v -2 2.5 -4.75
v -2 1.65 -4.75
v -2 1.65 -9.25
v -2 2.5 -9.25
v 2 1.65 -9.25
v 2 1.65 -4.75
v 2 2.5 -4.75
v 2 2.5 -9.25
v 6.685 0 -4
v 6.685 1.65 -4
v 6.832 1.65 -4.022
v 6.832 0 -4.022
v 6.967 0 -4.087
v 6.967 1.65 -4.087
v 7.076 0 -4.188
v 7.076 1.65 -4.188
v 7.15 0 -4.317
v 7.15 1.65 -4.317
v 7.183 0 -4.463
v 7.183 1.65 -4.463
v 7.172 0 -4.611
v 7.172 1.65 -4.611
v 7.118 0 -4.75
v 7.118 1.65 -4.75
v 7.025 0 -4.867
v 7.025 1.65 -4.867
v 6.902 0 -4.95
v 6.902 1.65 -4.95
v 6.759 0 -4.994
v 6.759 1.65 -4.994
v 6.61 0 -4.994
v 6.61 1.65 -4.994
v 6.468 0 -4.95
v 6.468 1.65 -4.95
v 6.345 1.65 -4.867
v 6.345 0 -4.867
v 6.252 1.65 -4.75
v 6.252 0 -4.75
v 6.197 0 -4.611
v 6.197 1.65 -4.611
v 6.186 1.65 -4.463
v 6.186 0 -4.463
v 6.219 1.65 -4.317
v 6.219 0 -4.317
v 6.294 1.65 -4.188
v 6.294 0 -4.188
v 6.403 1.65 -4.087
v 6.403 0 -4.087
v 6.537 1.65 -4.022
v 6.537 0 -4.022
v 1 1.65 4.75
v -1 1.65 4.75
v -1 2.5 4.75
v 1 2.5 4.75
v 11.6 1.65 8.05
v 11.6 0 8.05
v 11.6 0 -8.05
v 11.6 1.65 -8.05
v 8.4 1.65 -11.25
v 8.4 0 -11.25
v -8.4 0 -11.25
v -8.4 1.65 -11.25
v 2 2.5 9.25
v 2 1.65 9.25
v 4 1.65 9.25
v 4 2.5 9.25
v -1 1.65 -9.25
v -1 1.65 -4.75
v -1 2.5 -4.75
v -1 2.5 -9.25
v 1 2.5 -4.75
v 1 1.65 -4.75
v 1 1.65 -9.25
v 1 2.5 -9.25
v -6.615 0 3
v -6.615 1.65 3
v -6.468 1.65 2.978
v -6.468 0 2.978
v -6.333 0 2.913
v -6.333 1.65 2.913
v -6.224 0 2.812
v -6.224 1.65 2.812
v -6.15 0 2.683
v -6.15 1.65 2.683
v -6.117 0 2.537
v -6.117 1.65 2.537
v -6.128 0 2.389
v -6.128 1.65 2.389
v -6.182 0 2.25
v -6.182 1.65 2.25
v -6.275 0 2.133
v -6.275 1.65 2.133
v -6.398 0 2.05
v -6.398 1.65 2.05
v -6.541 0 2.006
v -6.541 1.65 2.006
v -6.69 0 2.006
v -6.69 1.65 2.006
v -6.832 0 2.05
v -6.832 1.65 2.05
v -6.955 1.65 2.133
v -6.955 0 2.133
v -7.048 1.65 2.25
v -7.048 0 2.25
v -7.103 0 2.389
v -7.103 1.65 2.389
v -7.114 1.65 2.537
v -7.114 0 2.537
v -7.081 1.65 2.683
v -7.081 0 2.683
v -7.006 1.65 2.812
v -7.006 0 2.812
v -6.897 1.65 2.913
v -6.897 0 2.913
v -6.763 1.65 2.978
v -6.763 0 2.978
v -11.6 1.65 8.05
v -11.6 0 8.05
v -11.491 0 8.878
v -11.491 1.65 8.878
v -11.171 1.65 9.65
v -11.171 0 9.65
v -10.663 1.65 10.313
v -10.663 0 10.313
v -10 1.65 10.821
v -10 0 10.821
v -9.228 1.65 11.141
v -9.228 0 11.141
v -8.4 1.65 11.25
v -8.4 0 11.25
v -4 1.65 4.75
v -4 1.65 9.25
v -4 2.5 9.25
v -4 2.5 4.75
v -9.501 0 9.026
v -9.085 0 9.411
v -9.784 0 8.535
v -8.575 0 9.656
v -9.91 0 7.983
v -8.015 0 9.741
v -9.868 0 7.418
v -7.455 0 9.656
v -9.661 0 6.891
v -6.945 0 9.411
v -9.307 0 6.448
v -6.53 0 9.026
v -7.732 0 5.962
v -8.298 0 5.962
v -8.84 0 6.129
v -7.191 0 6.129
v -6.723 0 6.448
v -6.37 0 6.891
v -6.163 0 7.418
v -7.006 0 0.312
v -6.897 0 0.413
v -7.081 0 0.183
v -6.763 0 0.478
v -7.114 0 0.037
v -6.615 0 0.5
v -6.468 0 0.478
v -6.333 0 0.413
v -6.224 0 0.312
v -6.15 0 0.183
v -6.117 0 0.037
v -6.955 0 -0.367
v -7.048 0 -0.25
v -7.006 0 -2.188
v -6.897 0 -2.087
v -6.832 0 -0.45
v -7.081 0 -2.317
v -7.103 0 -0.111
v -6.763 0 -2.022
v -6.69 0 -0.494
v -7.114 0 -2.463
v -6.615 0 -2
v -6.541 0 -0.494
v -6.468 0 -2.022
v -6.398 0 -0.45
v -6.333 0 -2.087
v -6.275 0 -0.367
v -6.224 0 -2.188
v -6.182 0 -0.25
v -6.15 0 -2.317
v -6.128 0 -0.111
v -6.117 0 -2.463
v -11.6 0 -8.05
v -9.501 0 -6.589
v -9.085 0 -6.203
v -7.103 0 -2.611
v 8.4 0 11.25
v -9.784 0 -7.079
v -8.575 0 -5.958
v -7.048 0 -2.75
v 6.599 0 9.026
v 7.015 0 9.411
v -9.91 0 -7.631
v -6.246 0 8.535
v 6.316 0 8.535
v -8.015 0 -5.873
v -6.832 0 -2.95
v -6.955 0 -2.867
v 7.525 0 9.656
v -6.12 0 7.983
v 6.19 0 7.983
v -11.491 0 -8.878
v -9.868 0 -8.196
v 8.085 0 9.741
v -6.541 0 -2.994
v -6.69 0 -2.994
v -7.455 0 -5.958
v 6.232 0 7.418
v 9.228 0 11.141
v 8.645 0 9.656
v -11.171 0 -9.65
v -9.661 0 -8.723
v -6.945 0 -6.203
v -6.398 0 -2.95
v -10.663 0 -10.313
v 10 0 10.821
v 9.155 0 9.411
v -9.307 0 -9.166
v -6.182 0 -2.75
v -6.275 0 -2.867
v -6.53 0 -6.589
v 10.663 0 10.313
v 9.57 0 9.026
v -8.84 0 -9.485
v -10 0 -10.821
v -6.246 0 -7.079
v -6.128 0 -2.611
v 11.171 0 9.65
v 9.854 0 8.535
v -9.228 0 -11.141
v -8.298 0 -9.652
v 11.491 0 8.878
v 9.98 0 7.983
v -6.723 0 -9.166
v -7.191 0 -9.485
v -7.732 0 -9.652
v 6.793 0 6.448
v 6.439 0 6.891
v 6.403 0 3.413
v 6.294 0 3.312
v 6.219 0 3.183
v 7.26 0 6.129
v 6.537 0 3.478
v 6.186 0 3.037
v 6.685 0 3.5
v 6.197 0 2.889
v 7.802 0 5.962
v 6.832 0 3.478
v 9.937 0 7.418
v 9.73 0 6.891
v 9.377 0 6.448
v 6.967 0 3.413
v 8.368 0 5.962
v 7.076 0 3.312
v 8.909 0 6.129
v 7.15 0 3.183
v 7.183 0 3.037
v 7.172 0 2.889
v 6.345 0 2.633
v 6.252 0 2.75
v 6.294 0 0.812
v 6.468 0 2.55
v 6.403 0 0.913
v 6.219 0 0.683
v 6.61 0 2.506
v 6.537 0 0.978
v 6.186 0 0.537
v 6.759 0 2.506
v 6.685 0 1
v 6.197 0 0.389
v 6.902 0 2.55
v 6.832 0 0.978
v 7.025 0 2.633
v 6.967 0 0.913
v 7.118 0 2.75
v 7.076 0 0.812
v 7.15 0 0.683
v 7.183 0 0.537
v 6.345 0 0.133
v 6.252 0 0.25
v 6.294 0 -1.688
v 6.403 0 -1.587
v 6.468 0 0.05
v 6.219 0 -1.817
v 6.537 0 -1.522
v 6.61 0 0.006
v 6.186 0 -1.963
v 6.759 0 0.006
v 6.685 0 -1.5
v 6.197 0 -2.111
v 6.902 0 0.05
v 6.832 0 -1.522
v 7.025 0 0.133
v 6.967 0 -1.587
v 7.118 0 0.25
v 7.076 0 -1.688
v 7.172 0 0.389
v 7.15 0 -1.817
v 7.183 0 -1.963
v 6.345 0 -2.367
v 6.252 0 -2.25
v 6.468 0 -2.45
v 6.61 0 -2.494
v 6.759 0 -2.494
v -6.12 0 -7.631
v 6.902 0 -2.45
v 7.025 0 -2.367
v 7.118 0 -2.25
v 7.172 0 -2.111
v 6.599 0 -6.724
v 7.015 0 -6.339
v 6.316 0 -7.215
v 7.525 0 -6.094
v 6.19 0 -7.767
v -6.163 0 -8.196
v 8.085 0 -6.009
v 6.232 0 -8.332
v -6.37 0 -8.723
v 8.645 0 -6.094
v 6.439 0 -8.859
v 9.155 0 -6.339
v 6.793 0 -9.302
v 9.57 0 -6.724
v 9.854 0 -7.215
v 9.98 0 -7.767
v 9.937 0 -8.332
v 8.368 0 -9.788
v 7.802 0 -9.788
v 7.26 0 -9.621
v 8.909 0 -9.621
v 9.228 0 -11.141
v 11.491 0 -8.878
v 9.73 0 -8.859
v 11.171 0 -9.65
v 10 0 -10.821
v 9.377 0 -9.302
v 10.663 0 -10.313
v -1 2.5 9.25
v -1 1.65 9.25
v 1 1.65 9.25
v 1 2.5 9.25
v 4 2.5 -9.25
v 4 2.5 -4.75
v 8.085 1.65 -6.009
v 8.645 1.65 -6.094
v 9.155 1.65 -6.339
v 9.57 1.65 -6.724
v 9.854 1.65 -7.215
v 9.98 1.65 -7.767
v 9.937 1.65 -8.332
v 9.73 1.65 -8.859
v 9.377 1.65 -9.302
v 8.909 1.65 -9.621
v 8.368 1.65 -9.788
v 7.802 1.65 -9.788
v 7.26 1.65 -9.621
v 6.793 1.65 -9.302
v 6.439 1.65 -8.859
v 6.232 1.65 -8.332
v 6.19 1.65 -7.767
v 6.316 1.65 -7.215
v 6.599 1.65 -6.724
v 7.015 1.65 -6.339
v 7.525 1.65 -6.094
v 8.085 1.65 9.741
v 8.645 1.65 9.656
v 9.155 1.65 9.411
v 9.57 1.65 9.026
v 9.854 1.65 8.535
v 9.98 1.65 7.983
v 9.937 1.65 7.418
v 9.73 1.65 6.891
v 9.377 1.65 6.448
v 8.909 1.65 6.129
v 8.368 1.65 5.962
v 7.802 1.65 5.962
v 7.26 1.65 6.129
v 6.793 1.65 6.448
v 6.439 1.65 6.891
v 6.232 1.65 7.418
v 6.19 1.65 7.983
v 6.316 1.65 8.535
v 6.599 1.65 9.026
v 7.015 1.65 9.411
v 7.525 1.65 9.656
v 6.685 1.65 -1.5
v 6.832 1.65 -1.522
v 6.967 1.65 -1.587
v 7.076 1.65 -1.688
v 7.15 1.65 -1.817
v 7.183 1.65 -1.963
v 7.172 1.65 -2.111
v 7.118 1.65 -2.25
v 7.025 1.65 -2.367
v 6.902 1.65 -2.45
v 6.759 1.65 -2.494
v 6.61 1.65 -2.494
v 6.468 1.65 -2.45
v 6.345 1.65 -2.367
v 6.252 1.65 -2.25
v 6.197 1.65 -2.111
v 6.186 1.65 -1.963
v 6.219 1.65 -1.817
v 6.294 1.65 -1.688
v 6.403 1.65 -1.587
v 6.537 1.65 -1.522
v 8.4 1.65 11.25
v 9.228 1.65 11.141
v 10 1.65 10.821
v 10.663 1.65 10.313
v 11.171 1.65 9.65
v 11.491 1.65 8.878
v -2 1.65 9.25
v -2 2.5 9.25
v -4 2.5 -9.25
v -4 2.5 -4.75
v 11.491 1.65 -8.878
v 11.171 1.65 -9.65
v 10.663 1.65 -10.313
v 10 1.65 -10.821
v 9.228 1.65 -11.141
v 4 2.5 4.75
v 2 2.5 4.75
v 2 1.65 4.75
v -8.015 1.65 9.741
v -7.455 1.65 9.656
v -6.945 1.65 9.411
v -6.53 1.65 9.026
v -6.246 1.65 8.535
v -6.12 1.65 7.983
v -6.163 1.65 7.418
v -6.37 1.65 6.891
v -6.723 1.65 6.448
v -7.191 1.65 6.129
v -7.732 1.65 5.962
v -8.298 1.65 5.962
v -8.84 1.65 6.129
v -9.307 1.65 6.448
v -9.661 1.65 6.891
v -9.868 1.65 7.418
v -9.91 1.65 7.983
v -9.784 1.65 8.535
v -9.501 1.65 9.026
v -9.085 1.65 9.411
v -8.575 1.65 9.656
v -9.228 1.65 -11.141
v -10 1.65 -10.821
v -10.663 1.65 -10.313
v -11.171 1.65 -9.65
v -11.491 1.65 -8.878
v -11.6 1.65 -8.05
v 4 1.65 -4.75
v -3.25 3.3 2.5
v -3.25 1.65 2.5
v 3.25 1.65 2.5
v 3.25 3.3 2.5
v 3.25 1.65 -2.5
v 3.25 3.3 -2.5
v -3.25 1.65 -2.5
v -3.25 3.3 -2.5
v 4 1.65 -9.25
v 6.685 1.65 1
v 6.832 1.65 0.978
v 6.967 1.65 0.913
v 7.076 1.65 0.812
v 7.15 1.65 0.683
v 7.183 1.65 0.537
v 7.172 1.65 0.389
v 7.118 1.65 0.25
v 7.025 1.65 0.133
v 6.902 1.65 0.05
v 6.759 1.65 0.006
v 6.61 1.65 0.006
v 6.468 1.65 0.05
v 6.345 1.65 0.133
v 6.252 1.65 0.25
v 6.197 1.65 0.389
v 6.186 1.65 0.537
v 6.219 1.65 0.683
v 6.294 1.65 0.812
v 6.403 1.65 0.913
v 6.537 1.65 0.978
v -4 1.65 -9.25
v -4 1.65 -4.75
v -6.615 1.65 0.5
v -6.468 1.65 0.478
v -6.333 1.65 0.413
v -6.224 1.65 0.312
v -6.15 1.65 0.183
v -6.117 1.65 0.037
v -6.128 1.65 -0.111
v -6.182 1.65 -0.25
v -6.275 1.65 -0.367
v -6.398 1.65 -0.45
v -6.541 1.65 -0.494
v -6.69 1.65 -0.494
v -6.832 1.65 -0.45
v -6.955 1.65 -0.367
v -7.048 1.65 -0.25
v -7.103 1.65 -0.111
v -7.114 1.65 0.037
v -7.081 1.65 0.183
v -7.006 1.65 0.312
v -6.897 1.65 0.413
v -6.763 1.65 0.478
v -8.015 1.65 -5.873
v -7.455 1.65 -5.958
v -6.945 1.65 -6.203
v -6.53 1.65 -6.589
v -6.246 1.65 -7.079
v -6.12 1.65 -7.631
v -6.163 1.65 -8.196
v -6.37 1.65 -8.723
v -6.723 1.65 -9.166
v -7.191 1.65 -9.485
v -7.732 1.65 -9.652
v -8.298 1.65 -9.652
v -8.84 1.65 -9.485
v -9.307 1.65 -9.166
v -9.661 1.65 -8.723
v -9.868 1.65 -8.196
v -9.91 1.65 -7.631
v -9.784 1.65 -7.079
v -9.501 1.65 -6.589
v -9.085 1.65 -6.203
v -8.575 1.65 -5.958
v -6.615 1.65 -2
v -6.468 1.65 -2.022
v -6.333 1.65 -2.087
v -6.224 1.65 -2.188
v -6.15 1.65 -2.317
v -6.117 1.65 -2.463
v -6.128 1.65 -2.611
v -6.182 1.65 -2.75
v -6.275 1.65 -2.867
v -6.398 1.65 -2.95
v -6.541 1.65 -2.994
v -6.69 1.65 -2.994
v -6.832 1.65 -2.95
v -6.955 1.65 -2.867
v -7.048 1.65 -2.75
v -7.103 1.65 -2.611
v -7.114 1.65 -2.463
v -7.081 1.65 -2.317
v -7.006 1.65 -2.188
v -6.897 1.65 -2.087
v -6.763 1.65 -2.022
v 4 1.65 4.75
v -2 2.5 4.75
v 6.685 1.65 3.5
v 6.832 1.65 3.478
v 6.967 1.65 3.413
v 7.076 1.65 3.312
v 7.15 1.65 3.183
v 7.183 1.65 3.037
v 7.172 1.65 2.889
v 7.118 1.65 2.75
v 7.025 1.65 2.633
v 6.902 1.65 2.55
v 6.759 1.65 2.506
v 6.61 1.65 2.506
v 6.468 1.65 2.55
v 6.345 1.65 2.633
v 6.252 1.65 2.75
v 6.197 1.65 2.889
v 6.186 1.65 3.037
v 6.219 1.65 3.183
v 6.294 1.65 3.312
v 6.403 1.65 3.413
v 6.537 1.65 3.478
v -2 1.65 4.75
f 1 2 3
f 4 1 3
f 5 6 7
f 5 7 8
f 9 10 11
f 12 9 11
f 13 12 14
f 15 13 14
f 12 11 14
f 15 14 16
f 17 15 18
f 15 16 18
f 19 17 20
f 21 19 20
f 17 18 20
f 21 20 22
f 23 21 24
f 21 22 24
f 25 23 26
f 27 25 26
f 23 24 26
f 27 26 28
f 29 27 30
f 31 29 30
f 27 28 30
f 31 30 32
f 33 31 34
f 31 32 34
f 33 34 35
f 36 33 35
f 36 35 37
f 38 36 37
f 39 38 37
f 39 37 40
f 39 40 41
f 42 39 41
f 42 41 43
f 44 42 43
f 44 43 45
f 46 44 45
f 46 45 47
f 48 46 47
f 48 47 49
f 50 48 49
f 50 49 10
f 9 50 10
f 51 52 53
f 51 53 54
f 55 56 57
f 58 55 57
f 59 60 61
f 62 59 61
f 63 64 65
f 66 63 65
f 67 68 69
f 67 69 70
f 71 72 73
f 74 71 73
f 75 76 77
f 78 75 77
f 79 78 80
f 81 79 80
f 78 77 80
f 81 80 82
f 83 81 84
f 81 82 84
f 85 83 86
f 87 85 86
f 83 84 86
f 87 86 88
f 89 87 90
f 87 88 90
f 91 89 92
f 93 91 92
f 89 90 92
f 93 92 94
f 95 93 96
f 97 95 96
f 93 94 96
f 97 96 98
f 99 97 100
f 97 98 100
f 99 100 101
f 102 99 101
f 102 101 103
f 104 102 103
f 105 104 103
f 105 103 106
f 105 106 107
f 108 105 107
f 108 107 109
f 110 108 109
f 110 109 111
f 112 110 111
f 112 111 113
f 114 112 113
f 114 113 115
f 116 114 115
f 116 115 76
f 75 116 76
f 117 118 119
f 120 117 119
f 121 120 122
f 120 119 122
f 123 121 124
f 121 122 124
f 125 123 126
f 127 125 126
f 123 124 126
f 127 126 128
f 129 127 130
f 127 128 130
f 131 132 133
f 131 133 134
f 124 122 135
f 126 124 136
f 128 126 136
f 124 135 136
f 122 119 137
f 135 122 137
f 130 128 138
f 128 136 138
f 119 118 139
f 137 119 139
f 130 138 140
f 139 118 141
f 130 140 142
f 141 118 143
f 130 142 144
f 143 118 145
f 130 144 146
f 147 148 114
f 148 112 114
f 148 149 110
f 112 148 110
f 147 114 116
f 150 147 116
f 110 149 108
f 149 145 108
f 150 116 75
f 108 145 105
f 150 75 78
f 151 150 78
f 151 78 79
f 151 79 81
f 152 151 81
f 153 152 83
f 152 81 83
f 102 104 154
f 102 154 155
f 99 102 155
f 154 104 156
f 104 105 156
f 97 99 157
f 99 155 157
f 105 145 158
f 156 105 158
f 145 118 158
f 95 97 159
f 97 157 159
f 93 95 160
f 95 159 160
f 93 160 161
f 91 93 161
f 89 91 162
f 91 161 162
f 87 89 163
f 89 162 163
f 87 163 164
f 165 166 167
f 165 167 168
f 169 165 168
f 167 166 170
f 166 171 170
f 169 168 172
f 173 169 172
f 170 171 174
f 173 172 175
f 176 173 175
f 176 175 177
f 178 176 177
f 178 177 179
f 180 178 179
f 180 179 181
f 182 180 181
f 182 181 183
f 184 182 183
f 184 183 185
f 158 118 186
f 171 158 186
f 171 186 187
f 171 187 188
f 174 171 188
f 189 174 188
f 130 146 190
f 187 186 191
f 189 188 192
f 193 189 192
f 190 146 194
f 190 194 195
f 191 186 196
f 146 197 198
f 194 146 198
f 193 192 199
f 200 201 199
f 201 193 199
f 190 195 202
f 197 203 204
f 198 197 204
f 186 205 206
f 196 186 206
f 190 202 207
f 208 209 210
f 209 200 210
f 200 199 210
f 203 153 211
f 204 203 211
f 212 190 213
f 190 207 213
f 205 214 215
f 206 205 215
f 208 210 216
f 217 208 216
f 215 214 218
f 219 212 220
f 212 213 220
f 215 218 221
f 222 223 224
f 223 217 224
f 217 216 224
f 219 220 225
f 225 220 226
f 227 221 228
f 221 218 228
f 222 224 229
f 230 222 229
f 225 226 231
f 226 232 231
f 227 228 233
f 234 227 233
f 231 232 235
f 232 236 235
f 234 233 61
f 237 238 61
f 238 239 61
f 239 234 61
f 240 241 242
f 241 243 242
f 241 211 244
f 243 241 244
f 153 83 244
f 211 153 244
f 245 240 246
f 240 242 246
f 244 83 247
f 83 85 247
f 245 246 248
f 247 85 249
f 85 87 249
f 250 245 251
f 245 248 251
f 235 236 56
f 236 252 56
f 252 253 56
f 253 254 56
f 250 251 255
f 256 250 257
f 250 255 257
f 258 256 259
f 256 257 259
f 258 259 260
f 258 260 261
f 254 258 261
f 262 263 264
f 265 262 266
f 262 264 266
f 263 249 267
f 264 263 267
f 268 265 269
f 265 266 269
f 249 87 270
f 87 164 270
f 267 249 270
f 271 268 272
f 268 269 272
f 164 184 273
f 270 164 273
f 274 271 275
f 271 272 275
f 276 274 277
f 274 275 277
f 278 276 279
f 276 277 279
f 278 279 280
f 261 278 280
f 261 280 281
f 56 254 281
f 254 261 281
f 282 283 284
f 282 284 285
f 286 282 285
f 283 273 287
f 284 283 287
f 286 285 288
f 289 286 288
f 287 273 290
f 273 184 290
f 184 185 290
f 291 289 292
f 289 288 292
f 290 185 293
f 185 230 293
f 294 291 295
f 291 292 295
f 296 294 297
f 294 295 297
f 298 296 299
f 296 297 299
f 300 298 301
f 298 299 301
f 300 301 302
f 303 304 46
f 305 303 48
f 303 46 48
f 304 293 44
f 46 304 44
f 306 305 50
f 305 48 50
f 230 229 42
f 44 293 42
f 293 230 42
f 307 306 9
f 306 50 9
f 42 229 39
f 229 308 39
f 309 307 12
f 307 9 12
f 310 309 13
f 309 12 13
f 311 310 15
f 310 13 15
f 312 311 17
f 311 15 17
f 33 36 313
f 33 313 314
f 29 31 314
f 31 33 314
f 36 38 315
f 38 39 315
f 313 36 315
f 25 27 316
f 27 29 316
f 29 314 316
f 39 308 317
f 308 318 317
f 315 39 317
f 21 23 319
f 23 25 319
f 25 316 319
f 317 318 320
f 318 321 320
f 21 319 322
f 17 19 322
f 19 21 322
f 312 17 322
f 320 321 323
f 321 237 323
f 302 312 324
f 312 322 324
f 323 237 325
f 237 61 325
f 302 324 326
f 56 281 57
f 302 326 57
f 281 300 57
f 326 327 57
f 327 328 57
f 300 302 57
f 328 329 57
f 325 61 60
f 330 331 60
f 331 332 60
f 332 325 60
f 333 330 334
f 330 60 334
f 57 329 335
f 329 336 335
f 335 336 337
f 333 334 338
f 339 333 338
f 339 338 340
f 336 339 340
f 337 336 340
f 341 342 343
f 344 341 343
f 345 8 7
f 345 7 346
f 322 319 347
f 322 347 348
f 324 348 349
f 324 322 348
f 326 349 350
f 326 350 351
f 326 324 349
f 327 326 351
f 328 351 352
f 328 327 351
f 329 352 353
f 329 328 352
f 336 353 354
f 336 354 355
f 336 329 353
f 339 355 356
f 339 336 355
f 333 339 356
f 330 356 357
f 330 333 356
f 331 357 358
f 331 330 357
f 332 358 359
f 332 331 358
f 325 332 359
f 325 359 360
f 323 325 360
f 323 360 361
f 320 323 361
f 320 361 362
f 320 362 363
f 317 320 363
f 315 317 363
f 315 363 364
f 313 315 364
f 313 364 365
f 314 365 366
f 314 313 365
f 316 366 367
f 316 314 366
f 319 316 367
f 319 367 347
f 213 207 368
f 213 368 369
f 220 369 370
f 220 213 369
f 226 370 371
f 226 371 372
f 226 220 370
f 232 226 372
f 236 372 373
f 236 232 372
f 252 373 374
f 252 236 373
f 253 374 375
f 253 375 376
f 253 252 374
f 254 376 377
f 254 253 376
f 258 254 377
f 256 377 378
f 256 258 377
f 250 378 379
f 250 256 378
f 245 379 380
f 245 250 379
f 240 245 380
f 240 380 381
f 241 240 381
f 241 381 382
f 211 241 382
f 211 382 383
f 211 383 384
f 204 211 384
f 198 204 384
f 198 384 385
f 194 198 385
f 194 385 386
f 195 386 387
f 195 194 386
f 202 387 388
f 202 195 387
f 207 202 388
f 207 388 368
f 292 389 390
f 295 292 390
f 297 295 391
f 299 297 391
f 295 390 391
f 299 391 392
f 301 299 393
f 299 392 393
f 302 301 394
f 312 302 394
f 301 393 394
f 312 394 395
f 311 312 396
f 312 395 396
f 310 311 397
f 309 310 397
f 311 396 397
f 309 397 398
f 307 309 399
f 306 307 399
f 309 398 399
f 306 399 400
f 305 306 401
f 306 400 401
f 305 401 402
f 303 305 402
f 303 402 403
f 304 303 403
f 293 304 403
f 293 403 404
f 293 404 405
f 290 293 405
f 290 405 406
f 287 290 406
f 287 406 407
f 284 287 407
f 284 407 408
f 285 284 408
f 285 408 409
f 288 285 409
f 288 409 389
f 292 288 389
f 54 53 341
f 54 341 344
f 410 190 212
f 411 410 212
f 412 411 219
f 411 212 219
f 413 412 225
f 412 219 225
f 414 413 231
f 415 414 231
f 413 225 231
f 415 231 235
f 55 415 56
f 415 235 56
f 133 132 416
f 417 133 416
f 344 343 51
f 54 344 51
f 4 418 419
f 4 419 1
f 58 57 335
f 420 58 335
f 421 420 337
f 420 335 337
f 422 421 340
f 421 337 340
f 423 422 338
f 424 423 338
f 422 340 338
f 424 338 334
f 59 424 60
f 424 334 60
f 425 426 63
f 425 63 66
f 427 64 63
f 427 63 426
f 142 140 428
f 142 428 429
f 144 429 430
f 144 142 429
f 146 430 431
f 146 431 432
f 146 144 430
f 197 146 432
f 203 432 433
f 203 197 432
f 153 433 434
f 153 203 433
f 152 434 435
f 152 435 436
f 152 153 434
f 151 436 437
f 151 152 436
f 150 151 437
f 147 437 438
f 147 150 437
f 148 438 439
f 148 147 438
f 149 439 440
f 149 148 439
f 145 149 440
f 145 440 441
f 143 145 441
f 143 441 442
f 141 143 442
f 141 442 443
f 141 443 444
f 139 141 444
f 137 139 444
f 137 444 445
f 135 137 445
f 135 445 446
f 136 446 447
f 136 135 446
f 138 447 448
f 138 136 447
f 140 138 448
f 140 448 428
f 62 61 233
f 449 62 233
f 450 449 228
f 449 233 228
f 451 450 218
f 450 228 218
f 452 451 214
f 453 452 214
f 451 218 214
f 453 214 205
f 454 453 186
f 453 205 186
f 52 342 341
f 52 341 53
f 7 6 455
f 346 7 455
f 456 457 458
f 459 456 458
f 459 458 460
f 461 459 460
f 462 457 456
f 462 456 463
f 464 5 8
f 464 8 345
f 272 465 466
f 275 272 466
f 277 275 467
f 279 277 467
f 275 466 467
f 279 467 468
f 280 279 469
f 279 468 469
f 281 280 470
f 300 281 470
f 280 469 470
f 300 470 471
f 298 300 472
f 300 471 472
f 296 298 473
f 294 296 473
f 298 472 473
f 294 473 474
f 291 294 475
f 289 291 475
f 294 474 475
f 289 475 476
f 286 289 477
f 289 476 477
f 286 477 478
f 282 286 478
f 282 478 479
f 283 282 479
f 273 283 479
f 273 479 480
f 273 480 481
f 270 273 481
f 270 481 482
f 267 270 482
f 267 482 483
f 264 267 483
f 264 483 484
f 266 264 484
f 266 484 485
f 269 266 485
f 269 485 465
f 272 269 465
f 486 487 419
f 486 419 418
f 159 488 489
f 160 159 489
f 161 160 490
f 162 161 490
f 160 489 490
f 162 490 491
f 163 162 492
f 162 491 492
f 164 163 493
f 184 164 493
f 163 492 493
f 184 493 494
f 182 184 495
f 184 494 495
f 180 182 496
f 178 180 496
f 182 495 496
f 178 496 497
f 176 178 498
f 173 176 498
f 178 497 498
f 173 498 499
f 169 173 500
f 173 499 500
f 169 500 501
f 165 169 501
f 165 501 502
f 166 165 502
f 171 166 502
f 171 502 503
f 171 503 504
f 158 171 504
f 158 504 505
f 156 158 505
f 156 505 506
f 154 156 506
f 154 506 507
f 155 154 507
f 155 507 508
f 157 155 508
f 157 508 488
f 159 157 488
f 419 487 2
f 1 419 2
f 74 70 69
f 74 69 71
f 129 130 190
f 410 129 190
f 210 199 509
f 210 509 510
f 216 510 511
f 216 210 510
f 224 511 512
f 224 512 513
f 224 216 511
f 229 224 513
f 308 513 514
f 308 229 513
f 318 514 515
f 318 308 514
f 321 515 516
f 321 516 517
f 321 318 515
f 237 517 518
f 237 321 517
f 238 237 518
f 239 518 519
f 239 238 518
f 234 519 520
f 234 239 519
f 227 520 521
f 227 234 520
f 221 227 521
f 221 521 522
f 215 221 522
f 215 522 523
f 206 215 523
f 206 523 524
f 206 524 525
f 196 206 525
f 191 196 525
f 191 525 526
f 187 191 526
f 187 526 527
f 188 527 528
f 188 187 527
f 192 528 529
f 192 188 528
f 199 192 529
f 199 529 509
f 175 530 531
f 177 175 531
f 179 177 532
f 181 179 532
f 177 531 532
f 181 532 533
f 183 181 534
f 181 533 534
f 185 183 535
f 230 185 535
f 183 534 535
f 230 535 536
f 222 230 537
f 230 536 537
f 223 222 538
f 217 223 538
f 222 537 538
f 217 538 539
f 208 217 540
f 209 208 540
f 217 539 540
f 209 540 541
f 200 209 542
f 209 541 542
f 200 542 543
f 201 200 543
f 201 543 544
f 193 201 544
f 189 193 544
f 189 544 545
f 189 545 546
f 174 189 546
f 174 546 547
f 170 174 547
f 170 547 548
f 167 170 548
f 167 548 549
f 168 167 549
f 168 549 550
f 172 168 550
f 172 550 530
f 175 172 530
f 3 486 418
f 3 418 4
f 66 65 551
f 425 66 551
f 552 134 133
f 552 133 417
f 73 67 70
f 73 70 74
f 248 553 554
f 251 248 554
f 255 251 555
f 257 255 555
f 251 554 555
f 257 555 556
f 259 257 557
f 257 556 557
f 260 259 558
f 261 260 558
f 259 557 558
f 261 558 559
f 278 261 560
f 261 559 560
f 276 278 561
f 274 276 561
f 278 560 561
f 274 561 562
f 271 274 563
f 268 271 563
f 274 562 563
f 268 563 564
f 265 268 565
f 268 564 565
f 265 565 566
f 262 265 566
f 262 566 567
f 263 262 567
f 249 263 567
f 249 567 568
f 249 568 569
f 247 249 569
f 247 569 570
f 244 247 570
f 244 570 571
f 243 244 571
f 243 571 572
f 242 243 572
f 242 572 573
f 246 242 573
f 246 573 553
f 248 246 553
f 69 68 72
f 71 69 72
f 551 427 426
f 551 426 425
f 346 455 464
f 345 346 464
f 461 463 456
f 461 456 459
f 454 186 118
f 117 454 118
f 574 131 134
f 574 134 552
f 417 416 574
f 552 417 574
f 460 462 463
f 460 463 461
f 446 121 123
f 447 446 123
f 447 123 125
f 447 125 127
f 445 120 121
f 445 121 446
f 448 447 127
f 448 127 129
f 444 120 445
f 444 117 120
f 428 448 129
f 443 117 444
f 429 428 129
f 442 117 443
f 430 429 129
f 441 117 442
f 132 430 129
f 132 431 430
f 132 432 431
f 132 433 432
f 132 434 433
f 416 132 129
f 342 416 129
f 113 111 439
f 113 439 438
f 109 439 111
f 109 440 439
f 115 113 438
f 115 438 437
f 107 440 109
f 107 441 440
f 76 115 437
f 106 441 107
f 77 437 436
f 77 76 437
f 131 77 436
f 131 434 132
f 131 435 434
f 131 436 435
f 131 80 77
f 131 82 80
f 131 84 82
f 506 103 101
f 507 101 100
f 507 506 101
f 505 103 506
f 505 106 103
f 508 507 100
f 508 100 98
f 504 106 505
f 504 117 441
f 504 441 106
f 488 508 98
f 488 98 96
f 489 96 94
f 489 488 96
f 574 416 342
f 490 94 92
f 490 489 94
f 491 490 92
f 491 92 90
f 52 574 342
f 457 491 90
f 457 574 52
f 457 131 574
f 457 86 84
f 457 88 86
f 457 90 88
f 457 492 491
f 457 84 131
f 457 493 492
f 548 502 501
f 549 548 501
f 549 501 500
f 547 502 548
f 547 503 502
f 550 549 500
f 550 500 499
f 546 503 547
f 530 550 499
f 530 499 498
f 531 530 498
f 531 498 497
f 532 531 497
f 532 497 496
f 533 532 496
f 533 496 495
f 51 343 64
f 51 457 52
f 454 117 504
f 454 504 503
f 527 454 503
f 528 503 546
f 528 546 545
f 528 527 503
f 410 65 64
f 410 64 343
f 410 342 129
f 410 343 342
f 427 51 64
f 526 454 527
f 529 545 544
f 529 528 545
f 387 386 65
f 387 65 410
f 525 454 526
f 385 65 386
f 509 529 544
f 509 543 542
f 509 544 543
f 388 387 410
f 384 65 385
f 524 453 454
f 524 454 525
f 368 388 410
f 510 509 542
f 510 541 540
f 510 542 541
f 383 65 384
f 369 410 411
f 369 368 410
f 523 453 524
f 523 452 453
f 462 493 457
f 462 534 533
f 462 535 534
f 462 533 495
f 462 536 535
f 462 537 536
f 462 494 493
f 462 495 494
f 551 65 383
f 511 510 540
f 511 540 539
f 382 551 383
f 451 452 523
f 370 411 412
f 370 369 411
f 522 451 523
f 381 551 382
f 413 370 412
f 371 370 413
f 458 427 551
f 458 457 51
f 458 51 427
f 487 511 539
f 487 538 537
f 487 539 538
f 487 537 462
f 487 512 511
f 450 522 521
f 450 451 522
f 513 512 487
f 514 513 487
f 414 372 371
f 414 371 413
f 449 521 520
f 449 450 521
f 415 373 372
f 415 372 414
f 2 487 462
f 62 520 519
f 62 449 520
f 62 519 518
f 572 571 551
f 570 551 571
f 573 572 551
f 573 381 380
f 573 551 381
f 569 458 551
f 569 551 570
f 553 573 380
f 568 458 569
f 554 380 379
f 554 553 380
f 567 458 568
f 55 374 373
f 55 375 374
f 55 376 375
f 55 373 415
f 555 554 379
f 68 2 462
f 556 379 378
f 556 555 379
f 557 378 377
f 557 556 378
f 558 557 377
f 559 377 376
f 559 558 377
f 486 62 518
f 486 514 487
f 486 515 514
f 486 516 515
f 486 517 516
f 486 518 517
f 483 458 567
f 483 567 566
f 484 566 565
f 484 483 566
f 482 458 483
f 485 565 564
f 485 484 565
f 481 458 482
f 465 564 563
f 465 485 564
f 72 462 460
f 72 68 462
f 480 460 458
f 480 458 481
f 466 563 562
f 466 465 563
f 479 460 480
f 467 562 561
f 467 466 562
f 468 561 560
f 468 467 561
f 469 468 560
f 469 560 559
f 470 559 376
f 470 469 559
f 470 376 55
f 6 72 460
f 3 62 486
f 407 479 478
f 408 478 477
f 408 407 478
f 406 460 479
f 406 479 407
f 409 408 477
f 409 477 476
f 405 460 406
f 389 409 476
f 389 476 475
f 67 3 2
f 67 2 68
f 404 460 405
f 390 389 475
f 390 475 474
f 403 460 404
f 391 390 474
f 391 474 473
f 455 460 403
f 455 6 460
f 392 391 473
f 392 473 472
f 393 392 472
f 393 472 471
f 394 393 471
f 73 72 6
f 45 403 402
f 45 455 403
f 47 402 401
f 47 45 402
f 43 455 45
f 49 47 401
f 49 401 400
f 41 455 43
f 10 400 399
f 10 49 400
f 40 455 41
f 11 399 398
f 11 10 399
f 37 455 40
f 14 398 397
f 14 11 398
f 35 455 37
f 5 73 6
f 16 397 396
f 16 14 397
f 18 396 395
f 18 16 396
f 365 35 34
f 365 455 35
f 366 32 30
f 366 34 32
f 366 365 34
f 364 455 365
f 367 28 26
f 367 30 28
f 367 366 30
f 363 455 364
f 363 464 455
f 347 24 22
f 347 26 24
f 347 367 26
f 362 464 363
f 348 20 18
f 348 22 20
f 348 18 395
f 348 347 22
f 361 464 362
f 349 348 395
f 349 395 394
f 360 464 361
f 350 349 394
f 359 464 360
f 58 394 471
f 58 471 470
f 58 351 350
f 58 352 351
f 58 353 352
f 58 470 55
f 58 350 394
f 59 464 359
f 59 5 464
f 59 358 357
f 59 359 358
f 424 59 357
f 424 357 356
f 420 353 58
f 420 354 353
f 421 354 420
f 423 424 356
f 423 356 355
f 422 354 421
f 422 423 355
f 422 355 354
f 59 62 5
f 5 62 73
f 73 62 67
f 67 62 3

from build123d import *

# Parameters (mm, degrees)
SKETCH1_R           = 1.9
BOSS_EXTRUDE1_DEPTH = 1.65
SKETCH3_W           = 2
SKETCH3_H           = 4.5
BOSS_EXTRUDE2_DEPTH = 0.85
SKETCH4_W           = 6.5
SKETCH4_H           = 5
BOSS_EXTRUDE3_DEPTH = 1.65
SKETCH5_R           = 0.5
CUT_EXTRUDE1_DEPTH  = 17.243306314


with BuildPart() as part:
    # Sketch1 → Boss-Extrude1 (new body)
    with BuildSketch(Plane(origin=(0, 0, 0), x_dir=(1, 0, 0), z_dir=(0, 1, 0))):
        with BuildLine():
            Line((-8.4, -11.25), (8.4, -11.25))
            ThreePointArc((8.4, -11.25), (10.6627417, -10.3127417), (11.6, -8.05))
            Line((11.6, -8.05), (11.6, 8.05))
            ThreePointArc((11.6, 8.05), (10.6627417, 10.3127417), (8.4, 11.25))
            Line((8.4, 11.25), (-8.4, 11.25))
            ThreePointArc((-8.4, 11.25), (-10.6627417, 10.3127417), (-11.6, 8.05))
            Line((-11.6, 8.05), (-11.6, -8.05))
            ThreePointArc((-11.6, -8.05), (-10.6627417, -10.3127417), (-8.4, -11.25))
        make_face()
        with Locations(Location((-8.015151515, 7.773315047, 0), (0, 0, 270))):
            Circle(SKETCH1_R, mode=Mode.SUBTRACT)
        with Locations(Location((8.084848485, 7.909090909, 0), (0, 0, 270))):
            Circle(SKETCH1_R, mode=Mode.SUBTRACT)
        with Locations(Location((8.084848485, -7.840909091, 0), (0, 0, 270))):
            Circle(SKETCH1_R, mode=Mode.SUBTRACT)
        with Locations(Location((-8.015151515, -7.840909091, 0), (0, 0, 270))):
            Circle(SKETCH1_R, mode=Mode.SUBTRACT)
    extrude(amount=BOSS_EXTRUDE1_DEPTH)

    # Sketch3 → Boss-Extrude2 (add)
    with BuildSketch(Plane(origin=(0, 1.65, 0), x_dir=(1, 0, 0), z_dir=(0, 1, 0))):
        with Locations((-3, 7)):
            Rectangle(SKETCH3_W, SKETCH3_H)
        with Locations((0, 7)):
            Rectangle(SKETCH3_W, SKETCH3_H)
        with Locations((3, 7)):
            Rectangle(SKETCH3_W, SKETCH3_H)
        with Locations((3, -7)):
            Rectangle(SKETCH3_W, SKETCH3_H)
        with Locations((0, -7)):
            Rectangle(SKETCH3_W, SKETCH3_H)
        with Locations((-3, -7)):
            Rectangle(SKETCH3_W, SKETCH3_H)
    extrude(amount=BOSS_EXTRUDE2_DEPTH)

    # Sketch4 → Boss-Extrude3 (add)
    with BuildSketch(Plane(origin=(0, 1.65, 0), x_dir=(1, 0, 0), z_dir=(0, 1, 0))):
        Rectangle(SKETCH4_W, SKETCH4_H)
    extrude(amount=BOSS_EXTRUDE3_DEPTH)

    # Sketch5 → Cut-Extrude1 (cut, through all)
    with BuildSketch(Plane(origin=(0, 1.65, 0), x_dir=(1, 0, 0), z_dir=(0, 1, 0))):
        with Locations(Location((-6.615151515, 0, 0), (0, 0, 270))):
            Circle(SKETCH5_R)
        with Locations(Location((-6.615151515, 2.5, 0), (0, 0, 270))):
            Circle(SKETCH5_R)
        with Locations(Location((-6.615151515, -2.5, 0), (0, 0, 270))):
            Circle(SKETCH5_R)
        with Locations(Location((6.684848485, 4.5, 0), (0, 0, 270))):
            Circle(SKETCH5_R)
        with Locations(Location((6.684848485, 2, 0), (0, 0, 270))):
            Circle(SKETCH5_R)
        with Locations(Location((6.684848485, -0.5, 0), (0, 0, 270))):
            Circle(SKETCH5_R)
        with Locations(Location((6.684848485, -3, 0), (0, 0, 270))):
            Circle(SKETCH5_R)
    extrude(amount=-CUT_EXTRUDE1_DEPTH, mode=Mode.SUBTRACT)


solid = part.part
